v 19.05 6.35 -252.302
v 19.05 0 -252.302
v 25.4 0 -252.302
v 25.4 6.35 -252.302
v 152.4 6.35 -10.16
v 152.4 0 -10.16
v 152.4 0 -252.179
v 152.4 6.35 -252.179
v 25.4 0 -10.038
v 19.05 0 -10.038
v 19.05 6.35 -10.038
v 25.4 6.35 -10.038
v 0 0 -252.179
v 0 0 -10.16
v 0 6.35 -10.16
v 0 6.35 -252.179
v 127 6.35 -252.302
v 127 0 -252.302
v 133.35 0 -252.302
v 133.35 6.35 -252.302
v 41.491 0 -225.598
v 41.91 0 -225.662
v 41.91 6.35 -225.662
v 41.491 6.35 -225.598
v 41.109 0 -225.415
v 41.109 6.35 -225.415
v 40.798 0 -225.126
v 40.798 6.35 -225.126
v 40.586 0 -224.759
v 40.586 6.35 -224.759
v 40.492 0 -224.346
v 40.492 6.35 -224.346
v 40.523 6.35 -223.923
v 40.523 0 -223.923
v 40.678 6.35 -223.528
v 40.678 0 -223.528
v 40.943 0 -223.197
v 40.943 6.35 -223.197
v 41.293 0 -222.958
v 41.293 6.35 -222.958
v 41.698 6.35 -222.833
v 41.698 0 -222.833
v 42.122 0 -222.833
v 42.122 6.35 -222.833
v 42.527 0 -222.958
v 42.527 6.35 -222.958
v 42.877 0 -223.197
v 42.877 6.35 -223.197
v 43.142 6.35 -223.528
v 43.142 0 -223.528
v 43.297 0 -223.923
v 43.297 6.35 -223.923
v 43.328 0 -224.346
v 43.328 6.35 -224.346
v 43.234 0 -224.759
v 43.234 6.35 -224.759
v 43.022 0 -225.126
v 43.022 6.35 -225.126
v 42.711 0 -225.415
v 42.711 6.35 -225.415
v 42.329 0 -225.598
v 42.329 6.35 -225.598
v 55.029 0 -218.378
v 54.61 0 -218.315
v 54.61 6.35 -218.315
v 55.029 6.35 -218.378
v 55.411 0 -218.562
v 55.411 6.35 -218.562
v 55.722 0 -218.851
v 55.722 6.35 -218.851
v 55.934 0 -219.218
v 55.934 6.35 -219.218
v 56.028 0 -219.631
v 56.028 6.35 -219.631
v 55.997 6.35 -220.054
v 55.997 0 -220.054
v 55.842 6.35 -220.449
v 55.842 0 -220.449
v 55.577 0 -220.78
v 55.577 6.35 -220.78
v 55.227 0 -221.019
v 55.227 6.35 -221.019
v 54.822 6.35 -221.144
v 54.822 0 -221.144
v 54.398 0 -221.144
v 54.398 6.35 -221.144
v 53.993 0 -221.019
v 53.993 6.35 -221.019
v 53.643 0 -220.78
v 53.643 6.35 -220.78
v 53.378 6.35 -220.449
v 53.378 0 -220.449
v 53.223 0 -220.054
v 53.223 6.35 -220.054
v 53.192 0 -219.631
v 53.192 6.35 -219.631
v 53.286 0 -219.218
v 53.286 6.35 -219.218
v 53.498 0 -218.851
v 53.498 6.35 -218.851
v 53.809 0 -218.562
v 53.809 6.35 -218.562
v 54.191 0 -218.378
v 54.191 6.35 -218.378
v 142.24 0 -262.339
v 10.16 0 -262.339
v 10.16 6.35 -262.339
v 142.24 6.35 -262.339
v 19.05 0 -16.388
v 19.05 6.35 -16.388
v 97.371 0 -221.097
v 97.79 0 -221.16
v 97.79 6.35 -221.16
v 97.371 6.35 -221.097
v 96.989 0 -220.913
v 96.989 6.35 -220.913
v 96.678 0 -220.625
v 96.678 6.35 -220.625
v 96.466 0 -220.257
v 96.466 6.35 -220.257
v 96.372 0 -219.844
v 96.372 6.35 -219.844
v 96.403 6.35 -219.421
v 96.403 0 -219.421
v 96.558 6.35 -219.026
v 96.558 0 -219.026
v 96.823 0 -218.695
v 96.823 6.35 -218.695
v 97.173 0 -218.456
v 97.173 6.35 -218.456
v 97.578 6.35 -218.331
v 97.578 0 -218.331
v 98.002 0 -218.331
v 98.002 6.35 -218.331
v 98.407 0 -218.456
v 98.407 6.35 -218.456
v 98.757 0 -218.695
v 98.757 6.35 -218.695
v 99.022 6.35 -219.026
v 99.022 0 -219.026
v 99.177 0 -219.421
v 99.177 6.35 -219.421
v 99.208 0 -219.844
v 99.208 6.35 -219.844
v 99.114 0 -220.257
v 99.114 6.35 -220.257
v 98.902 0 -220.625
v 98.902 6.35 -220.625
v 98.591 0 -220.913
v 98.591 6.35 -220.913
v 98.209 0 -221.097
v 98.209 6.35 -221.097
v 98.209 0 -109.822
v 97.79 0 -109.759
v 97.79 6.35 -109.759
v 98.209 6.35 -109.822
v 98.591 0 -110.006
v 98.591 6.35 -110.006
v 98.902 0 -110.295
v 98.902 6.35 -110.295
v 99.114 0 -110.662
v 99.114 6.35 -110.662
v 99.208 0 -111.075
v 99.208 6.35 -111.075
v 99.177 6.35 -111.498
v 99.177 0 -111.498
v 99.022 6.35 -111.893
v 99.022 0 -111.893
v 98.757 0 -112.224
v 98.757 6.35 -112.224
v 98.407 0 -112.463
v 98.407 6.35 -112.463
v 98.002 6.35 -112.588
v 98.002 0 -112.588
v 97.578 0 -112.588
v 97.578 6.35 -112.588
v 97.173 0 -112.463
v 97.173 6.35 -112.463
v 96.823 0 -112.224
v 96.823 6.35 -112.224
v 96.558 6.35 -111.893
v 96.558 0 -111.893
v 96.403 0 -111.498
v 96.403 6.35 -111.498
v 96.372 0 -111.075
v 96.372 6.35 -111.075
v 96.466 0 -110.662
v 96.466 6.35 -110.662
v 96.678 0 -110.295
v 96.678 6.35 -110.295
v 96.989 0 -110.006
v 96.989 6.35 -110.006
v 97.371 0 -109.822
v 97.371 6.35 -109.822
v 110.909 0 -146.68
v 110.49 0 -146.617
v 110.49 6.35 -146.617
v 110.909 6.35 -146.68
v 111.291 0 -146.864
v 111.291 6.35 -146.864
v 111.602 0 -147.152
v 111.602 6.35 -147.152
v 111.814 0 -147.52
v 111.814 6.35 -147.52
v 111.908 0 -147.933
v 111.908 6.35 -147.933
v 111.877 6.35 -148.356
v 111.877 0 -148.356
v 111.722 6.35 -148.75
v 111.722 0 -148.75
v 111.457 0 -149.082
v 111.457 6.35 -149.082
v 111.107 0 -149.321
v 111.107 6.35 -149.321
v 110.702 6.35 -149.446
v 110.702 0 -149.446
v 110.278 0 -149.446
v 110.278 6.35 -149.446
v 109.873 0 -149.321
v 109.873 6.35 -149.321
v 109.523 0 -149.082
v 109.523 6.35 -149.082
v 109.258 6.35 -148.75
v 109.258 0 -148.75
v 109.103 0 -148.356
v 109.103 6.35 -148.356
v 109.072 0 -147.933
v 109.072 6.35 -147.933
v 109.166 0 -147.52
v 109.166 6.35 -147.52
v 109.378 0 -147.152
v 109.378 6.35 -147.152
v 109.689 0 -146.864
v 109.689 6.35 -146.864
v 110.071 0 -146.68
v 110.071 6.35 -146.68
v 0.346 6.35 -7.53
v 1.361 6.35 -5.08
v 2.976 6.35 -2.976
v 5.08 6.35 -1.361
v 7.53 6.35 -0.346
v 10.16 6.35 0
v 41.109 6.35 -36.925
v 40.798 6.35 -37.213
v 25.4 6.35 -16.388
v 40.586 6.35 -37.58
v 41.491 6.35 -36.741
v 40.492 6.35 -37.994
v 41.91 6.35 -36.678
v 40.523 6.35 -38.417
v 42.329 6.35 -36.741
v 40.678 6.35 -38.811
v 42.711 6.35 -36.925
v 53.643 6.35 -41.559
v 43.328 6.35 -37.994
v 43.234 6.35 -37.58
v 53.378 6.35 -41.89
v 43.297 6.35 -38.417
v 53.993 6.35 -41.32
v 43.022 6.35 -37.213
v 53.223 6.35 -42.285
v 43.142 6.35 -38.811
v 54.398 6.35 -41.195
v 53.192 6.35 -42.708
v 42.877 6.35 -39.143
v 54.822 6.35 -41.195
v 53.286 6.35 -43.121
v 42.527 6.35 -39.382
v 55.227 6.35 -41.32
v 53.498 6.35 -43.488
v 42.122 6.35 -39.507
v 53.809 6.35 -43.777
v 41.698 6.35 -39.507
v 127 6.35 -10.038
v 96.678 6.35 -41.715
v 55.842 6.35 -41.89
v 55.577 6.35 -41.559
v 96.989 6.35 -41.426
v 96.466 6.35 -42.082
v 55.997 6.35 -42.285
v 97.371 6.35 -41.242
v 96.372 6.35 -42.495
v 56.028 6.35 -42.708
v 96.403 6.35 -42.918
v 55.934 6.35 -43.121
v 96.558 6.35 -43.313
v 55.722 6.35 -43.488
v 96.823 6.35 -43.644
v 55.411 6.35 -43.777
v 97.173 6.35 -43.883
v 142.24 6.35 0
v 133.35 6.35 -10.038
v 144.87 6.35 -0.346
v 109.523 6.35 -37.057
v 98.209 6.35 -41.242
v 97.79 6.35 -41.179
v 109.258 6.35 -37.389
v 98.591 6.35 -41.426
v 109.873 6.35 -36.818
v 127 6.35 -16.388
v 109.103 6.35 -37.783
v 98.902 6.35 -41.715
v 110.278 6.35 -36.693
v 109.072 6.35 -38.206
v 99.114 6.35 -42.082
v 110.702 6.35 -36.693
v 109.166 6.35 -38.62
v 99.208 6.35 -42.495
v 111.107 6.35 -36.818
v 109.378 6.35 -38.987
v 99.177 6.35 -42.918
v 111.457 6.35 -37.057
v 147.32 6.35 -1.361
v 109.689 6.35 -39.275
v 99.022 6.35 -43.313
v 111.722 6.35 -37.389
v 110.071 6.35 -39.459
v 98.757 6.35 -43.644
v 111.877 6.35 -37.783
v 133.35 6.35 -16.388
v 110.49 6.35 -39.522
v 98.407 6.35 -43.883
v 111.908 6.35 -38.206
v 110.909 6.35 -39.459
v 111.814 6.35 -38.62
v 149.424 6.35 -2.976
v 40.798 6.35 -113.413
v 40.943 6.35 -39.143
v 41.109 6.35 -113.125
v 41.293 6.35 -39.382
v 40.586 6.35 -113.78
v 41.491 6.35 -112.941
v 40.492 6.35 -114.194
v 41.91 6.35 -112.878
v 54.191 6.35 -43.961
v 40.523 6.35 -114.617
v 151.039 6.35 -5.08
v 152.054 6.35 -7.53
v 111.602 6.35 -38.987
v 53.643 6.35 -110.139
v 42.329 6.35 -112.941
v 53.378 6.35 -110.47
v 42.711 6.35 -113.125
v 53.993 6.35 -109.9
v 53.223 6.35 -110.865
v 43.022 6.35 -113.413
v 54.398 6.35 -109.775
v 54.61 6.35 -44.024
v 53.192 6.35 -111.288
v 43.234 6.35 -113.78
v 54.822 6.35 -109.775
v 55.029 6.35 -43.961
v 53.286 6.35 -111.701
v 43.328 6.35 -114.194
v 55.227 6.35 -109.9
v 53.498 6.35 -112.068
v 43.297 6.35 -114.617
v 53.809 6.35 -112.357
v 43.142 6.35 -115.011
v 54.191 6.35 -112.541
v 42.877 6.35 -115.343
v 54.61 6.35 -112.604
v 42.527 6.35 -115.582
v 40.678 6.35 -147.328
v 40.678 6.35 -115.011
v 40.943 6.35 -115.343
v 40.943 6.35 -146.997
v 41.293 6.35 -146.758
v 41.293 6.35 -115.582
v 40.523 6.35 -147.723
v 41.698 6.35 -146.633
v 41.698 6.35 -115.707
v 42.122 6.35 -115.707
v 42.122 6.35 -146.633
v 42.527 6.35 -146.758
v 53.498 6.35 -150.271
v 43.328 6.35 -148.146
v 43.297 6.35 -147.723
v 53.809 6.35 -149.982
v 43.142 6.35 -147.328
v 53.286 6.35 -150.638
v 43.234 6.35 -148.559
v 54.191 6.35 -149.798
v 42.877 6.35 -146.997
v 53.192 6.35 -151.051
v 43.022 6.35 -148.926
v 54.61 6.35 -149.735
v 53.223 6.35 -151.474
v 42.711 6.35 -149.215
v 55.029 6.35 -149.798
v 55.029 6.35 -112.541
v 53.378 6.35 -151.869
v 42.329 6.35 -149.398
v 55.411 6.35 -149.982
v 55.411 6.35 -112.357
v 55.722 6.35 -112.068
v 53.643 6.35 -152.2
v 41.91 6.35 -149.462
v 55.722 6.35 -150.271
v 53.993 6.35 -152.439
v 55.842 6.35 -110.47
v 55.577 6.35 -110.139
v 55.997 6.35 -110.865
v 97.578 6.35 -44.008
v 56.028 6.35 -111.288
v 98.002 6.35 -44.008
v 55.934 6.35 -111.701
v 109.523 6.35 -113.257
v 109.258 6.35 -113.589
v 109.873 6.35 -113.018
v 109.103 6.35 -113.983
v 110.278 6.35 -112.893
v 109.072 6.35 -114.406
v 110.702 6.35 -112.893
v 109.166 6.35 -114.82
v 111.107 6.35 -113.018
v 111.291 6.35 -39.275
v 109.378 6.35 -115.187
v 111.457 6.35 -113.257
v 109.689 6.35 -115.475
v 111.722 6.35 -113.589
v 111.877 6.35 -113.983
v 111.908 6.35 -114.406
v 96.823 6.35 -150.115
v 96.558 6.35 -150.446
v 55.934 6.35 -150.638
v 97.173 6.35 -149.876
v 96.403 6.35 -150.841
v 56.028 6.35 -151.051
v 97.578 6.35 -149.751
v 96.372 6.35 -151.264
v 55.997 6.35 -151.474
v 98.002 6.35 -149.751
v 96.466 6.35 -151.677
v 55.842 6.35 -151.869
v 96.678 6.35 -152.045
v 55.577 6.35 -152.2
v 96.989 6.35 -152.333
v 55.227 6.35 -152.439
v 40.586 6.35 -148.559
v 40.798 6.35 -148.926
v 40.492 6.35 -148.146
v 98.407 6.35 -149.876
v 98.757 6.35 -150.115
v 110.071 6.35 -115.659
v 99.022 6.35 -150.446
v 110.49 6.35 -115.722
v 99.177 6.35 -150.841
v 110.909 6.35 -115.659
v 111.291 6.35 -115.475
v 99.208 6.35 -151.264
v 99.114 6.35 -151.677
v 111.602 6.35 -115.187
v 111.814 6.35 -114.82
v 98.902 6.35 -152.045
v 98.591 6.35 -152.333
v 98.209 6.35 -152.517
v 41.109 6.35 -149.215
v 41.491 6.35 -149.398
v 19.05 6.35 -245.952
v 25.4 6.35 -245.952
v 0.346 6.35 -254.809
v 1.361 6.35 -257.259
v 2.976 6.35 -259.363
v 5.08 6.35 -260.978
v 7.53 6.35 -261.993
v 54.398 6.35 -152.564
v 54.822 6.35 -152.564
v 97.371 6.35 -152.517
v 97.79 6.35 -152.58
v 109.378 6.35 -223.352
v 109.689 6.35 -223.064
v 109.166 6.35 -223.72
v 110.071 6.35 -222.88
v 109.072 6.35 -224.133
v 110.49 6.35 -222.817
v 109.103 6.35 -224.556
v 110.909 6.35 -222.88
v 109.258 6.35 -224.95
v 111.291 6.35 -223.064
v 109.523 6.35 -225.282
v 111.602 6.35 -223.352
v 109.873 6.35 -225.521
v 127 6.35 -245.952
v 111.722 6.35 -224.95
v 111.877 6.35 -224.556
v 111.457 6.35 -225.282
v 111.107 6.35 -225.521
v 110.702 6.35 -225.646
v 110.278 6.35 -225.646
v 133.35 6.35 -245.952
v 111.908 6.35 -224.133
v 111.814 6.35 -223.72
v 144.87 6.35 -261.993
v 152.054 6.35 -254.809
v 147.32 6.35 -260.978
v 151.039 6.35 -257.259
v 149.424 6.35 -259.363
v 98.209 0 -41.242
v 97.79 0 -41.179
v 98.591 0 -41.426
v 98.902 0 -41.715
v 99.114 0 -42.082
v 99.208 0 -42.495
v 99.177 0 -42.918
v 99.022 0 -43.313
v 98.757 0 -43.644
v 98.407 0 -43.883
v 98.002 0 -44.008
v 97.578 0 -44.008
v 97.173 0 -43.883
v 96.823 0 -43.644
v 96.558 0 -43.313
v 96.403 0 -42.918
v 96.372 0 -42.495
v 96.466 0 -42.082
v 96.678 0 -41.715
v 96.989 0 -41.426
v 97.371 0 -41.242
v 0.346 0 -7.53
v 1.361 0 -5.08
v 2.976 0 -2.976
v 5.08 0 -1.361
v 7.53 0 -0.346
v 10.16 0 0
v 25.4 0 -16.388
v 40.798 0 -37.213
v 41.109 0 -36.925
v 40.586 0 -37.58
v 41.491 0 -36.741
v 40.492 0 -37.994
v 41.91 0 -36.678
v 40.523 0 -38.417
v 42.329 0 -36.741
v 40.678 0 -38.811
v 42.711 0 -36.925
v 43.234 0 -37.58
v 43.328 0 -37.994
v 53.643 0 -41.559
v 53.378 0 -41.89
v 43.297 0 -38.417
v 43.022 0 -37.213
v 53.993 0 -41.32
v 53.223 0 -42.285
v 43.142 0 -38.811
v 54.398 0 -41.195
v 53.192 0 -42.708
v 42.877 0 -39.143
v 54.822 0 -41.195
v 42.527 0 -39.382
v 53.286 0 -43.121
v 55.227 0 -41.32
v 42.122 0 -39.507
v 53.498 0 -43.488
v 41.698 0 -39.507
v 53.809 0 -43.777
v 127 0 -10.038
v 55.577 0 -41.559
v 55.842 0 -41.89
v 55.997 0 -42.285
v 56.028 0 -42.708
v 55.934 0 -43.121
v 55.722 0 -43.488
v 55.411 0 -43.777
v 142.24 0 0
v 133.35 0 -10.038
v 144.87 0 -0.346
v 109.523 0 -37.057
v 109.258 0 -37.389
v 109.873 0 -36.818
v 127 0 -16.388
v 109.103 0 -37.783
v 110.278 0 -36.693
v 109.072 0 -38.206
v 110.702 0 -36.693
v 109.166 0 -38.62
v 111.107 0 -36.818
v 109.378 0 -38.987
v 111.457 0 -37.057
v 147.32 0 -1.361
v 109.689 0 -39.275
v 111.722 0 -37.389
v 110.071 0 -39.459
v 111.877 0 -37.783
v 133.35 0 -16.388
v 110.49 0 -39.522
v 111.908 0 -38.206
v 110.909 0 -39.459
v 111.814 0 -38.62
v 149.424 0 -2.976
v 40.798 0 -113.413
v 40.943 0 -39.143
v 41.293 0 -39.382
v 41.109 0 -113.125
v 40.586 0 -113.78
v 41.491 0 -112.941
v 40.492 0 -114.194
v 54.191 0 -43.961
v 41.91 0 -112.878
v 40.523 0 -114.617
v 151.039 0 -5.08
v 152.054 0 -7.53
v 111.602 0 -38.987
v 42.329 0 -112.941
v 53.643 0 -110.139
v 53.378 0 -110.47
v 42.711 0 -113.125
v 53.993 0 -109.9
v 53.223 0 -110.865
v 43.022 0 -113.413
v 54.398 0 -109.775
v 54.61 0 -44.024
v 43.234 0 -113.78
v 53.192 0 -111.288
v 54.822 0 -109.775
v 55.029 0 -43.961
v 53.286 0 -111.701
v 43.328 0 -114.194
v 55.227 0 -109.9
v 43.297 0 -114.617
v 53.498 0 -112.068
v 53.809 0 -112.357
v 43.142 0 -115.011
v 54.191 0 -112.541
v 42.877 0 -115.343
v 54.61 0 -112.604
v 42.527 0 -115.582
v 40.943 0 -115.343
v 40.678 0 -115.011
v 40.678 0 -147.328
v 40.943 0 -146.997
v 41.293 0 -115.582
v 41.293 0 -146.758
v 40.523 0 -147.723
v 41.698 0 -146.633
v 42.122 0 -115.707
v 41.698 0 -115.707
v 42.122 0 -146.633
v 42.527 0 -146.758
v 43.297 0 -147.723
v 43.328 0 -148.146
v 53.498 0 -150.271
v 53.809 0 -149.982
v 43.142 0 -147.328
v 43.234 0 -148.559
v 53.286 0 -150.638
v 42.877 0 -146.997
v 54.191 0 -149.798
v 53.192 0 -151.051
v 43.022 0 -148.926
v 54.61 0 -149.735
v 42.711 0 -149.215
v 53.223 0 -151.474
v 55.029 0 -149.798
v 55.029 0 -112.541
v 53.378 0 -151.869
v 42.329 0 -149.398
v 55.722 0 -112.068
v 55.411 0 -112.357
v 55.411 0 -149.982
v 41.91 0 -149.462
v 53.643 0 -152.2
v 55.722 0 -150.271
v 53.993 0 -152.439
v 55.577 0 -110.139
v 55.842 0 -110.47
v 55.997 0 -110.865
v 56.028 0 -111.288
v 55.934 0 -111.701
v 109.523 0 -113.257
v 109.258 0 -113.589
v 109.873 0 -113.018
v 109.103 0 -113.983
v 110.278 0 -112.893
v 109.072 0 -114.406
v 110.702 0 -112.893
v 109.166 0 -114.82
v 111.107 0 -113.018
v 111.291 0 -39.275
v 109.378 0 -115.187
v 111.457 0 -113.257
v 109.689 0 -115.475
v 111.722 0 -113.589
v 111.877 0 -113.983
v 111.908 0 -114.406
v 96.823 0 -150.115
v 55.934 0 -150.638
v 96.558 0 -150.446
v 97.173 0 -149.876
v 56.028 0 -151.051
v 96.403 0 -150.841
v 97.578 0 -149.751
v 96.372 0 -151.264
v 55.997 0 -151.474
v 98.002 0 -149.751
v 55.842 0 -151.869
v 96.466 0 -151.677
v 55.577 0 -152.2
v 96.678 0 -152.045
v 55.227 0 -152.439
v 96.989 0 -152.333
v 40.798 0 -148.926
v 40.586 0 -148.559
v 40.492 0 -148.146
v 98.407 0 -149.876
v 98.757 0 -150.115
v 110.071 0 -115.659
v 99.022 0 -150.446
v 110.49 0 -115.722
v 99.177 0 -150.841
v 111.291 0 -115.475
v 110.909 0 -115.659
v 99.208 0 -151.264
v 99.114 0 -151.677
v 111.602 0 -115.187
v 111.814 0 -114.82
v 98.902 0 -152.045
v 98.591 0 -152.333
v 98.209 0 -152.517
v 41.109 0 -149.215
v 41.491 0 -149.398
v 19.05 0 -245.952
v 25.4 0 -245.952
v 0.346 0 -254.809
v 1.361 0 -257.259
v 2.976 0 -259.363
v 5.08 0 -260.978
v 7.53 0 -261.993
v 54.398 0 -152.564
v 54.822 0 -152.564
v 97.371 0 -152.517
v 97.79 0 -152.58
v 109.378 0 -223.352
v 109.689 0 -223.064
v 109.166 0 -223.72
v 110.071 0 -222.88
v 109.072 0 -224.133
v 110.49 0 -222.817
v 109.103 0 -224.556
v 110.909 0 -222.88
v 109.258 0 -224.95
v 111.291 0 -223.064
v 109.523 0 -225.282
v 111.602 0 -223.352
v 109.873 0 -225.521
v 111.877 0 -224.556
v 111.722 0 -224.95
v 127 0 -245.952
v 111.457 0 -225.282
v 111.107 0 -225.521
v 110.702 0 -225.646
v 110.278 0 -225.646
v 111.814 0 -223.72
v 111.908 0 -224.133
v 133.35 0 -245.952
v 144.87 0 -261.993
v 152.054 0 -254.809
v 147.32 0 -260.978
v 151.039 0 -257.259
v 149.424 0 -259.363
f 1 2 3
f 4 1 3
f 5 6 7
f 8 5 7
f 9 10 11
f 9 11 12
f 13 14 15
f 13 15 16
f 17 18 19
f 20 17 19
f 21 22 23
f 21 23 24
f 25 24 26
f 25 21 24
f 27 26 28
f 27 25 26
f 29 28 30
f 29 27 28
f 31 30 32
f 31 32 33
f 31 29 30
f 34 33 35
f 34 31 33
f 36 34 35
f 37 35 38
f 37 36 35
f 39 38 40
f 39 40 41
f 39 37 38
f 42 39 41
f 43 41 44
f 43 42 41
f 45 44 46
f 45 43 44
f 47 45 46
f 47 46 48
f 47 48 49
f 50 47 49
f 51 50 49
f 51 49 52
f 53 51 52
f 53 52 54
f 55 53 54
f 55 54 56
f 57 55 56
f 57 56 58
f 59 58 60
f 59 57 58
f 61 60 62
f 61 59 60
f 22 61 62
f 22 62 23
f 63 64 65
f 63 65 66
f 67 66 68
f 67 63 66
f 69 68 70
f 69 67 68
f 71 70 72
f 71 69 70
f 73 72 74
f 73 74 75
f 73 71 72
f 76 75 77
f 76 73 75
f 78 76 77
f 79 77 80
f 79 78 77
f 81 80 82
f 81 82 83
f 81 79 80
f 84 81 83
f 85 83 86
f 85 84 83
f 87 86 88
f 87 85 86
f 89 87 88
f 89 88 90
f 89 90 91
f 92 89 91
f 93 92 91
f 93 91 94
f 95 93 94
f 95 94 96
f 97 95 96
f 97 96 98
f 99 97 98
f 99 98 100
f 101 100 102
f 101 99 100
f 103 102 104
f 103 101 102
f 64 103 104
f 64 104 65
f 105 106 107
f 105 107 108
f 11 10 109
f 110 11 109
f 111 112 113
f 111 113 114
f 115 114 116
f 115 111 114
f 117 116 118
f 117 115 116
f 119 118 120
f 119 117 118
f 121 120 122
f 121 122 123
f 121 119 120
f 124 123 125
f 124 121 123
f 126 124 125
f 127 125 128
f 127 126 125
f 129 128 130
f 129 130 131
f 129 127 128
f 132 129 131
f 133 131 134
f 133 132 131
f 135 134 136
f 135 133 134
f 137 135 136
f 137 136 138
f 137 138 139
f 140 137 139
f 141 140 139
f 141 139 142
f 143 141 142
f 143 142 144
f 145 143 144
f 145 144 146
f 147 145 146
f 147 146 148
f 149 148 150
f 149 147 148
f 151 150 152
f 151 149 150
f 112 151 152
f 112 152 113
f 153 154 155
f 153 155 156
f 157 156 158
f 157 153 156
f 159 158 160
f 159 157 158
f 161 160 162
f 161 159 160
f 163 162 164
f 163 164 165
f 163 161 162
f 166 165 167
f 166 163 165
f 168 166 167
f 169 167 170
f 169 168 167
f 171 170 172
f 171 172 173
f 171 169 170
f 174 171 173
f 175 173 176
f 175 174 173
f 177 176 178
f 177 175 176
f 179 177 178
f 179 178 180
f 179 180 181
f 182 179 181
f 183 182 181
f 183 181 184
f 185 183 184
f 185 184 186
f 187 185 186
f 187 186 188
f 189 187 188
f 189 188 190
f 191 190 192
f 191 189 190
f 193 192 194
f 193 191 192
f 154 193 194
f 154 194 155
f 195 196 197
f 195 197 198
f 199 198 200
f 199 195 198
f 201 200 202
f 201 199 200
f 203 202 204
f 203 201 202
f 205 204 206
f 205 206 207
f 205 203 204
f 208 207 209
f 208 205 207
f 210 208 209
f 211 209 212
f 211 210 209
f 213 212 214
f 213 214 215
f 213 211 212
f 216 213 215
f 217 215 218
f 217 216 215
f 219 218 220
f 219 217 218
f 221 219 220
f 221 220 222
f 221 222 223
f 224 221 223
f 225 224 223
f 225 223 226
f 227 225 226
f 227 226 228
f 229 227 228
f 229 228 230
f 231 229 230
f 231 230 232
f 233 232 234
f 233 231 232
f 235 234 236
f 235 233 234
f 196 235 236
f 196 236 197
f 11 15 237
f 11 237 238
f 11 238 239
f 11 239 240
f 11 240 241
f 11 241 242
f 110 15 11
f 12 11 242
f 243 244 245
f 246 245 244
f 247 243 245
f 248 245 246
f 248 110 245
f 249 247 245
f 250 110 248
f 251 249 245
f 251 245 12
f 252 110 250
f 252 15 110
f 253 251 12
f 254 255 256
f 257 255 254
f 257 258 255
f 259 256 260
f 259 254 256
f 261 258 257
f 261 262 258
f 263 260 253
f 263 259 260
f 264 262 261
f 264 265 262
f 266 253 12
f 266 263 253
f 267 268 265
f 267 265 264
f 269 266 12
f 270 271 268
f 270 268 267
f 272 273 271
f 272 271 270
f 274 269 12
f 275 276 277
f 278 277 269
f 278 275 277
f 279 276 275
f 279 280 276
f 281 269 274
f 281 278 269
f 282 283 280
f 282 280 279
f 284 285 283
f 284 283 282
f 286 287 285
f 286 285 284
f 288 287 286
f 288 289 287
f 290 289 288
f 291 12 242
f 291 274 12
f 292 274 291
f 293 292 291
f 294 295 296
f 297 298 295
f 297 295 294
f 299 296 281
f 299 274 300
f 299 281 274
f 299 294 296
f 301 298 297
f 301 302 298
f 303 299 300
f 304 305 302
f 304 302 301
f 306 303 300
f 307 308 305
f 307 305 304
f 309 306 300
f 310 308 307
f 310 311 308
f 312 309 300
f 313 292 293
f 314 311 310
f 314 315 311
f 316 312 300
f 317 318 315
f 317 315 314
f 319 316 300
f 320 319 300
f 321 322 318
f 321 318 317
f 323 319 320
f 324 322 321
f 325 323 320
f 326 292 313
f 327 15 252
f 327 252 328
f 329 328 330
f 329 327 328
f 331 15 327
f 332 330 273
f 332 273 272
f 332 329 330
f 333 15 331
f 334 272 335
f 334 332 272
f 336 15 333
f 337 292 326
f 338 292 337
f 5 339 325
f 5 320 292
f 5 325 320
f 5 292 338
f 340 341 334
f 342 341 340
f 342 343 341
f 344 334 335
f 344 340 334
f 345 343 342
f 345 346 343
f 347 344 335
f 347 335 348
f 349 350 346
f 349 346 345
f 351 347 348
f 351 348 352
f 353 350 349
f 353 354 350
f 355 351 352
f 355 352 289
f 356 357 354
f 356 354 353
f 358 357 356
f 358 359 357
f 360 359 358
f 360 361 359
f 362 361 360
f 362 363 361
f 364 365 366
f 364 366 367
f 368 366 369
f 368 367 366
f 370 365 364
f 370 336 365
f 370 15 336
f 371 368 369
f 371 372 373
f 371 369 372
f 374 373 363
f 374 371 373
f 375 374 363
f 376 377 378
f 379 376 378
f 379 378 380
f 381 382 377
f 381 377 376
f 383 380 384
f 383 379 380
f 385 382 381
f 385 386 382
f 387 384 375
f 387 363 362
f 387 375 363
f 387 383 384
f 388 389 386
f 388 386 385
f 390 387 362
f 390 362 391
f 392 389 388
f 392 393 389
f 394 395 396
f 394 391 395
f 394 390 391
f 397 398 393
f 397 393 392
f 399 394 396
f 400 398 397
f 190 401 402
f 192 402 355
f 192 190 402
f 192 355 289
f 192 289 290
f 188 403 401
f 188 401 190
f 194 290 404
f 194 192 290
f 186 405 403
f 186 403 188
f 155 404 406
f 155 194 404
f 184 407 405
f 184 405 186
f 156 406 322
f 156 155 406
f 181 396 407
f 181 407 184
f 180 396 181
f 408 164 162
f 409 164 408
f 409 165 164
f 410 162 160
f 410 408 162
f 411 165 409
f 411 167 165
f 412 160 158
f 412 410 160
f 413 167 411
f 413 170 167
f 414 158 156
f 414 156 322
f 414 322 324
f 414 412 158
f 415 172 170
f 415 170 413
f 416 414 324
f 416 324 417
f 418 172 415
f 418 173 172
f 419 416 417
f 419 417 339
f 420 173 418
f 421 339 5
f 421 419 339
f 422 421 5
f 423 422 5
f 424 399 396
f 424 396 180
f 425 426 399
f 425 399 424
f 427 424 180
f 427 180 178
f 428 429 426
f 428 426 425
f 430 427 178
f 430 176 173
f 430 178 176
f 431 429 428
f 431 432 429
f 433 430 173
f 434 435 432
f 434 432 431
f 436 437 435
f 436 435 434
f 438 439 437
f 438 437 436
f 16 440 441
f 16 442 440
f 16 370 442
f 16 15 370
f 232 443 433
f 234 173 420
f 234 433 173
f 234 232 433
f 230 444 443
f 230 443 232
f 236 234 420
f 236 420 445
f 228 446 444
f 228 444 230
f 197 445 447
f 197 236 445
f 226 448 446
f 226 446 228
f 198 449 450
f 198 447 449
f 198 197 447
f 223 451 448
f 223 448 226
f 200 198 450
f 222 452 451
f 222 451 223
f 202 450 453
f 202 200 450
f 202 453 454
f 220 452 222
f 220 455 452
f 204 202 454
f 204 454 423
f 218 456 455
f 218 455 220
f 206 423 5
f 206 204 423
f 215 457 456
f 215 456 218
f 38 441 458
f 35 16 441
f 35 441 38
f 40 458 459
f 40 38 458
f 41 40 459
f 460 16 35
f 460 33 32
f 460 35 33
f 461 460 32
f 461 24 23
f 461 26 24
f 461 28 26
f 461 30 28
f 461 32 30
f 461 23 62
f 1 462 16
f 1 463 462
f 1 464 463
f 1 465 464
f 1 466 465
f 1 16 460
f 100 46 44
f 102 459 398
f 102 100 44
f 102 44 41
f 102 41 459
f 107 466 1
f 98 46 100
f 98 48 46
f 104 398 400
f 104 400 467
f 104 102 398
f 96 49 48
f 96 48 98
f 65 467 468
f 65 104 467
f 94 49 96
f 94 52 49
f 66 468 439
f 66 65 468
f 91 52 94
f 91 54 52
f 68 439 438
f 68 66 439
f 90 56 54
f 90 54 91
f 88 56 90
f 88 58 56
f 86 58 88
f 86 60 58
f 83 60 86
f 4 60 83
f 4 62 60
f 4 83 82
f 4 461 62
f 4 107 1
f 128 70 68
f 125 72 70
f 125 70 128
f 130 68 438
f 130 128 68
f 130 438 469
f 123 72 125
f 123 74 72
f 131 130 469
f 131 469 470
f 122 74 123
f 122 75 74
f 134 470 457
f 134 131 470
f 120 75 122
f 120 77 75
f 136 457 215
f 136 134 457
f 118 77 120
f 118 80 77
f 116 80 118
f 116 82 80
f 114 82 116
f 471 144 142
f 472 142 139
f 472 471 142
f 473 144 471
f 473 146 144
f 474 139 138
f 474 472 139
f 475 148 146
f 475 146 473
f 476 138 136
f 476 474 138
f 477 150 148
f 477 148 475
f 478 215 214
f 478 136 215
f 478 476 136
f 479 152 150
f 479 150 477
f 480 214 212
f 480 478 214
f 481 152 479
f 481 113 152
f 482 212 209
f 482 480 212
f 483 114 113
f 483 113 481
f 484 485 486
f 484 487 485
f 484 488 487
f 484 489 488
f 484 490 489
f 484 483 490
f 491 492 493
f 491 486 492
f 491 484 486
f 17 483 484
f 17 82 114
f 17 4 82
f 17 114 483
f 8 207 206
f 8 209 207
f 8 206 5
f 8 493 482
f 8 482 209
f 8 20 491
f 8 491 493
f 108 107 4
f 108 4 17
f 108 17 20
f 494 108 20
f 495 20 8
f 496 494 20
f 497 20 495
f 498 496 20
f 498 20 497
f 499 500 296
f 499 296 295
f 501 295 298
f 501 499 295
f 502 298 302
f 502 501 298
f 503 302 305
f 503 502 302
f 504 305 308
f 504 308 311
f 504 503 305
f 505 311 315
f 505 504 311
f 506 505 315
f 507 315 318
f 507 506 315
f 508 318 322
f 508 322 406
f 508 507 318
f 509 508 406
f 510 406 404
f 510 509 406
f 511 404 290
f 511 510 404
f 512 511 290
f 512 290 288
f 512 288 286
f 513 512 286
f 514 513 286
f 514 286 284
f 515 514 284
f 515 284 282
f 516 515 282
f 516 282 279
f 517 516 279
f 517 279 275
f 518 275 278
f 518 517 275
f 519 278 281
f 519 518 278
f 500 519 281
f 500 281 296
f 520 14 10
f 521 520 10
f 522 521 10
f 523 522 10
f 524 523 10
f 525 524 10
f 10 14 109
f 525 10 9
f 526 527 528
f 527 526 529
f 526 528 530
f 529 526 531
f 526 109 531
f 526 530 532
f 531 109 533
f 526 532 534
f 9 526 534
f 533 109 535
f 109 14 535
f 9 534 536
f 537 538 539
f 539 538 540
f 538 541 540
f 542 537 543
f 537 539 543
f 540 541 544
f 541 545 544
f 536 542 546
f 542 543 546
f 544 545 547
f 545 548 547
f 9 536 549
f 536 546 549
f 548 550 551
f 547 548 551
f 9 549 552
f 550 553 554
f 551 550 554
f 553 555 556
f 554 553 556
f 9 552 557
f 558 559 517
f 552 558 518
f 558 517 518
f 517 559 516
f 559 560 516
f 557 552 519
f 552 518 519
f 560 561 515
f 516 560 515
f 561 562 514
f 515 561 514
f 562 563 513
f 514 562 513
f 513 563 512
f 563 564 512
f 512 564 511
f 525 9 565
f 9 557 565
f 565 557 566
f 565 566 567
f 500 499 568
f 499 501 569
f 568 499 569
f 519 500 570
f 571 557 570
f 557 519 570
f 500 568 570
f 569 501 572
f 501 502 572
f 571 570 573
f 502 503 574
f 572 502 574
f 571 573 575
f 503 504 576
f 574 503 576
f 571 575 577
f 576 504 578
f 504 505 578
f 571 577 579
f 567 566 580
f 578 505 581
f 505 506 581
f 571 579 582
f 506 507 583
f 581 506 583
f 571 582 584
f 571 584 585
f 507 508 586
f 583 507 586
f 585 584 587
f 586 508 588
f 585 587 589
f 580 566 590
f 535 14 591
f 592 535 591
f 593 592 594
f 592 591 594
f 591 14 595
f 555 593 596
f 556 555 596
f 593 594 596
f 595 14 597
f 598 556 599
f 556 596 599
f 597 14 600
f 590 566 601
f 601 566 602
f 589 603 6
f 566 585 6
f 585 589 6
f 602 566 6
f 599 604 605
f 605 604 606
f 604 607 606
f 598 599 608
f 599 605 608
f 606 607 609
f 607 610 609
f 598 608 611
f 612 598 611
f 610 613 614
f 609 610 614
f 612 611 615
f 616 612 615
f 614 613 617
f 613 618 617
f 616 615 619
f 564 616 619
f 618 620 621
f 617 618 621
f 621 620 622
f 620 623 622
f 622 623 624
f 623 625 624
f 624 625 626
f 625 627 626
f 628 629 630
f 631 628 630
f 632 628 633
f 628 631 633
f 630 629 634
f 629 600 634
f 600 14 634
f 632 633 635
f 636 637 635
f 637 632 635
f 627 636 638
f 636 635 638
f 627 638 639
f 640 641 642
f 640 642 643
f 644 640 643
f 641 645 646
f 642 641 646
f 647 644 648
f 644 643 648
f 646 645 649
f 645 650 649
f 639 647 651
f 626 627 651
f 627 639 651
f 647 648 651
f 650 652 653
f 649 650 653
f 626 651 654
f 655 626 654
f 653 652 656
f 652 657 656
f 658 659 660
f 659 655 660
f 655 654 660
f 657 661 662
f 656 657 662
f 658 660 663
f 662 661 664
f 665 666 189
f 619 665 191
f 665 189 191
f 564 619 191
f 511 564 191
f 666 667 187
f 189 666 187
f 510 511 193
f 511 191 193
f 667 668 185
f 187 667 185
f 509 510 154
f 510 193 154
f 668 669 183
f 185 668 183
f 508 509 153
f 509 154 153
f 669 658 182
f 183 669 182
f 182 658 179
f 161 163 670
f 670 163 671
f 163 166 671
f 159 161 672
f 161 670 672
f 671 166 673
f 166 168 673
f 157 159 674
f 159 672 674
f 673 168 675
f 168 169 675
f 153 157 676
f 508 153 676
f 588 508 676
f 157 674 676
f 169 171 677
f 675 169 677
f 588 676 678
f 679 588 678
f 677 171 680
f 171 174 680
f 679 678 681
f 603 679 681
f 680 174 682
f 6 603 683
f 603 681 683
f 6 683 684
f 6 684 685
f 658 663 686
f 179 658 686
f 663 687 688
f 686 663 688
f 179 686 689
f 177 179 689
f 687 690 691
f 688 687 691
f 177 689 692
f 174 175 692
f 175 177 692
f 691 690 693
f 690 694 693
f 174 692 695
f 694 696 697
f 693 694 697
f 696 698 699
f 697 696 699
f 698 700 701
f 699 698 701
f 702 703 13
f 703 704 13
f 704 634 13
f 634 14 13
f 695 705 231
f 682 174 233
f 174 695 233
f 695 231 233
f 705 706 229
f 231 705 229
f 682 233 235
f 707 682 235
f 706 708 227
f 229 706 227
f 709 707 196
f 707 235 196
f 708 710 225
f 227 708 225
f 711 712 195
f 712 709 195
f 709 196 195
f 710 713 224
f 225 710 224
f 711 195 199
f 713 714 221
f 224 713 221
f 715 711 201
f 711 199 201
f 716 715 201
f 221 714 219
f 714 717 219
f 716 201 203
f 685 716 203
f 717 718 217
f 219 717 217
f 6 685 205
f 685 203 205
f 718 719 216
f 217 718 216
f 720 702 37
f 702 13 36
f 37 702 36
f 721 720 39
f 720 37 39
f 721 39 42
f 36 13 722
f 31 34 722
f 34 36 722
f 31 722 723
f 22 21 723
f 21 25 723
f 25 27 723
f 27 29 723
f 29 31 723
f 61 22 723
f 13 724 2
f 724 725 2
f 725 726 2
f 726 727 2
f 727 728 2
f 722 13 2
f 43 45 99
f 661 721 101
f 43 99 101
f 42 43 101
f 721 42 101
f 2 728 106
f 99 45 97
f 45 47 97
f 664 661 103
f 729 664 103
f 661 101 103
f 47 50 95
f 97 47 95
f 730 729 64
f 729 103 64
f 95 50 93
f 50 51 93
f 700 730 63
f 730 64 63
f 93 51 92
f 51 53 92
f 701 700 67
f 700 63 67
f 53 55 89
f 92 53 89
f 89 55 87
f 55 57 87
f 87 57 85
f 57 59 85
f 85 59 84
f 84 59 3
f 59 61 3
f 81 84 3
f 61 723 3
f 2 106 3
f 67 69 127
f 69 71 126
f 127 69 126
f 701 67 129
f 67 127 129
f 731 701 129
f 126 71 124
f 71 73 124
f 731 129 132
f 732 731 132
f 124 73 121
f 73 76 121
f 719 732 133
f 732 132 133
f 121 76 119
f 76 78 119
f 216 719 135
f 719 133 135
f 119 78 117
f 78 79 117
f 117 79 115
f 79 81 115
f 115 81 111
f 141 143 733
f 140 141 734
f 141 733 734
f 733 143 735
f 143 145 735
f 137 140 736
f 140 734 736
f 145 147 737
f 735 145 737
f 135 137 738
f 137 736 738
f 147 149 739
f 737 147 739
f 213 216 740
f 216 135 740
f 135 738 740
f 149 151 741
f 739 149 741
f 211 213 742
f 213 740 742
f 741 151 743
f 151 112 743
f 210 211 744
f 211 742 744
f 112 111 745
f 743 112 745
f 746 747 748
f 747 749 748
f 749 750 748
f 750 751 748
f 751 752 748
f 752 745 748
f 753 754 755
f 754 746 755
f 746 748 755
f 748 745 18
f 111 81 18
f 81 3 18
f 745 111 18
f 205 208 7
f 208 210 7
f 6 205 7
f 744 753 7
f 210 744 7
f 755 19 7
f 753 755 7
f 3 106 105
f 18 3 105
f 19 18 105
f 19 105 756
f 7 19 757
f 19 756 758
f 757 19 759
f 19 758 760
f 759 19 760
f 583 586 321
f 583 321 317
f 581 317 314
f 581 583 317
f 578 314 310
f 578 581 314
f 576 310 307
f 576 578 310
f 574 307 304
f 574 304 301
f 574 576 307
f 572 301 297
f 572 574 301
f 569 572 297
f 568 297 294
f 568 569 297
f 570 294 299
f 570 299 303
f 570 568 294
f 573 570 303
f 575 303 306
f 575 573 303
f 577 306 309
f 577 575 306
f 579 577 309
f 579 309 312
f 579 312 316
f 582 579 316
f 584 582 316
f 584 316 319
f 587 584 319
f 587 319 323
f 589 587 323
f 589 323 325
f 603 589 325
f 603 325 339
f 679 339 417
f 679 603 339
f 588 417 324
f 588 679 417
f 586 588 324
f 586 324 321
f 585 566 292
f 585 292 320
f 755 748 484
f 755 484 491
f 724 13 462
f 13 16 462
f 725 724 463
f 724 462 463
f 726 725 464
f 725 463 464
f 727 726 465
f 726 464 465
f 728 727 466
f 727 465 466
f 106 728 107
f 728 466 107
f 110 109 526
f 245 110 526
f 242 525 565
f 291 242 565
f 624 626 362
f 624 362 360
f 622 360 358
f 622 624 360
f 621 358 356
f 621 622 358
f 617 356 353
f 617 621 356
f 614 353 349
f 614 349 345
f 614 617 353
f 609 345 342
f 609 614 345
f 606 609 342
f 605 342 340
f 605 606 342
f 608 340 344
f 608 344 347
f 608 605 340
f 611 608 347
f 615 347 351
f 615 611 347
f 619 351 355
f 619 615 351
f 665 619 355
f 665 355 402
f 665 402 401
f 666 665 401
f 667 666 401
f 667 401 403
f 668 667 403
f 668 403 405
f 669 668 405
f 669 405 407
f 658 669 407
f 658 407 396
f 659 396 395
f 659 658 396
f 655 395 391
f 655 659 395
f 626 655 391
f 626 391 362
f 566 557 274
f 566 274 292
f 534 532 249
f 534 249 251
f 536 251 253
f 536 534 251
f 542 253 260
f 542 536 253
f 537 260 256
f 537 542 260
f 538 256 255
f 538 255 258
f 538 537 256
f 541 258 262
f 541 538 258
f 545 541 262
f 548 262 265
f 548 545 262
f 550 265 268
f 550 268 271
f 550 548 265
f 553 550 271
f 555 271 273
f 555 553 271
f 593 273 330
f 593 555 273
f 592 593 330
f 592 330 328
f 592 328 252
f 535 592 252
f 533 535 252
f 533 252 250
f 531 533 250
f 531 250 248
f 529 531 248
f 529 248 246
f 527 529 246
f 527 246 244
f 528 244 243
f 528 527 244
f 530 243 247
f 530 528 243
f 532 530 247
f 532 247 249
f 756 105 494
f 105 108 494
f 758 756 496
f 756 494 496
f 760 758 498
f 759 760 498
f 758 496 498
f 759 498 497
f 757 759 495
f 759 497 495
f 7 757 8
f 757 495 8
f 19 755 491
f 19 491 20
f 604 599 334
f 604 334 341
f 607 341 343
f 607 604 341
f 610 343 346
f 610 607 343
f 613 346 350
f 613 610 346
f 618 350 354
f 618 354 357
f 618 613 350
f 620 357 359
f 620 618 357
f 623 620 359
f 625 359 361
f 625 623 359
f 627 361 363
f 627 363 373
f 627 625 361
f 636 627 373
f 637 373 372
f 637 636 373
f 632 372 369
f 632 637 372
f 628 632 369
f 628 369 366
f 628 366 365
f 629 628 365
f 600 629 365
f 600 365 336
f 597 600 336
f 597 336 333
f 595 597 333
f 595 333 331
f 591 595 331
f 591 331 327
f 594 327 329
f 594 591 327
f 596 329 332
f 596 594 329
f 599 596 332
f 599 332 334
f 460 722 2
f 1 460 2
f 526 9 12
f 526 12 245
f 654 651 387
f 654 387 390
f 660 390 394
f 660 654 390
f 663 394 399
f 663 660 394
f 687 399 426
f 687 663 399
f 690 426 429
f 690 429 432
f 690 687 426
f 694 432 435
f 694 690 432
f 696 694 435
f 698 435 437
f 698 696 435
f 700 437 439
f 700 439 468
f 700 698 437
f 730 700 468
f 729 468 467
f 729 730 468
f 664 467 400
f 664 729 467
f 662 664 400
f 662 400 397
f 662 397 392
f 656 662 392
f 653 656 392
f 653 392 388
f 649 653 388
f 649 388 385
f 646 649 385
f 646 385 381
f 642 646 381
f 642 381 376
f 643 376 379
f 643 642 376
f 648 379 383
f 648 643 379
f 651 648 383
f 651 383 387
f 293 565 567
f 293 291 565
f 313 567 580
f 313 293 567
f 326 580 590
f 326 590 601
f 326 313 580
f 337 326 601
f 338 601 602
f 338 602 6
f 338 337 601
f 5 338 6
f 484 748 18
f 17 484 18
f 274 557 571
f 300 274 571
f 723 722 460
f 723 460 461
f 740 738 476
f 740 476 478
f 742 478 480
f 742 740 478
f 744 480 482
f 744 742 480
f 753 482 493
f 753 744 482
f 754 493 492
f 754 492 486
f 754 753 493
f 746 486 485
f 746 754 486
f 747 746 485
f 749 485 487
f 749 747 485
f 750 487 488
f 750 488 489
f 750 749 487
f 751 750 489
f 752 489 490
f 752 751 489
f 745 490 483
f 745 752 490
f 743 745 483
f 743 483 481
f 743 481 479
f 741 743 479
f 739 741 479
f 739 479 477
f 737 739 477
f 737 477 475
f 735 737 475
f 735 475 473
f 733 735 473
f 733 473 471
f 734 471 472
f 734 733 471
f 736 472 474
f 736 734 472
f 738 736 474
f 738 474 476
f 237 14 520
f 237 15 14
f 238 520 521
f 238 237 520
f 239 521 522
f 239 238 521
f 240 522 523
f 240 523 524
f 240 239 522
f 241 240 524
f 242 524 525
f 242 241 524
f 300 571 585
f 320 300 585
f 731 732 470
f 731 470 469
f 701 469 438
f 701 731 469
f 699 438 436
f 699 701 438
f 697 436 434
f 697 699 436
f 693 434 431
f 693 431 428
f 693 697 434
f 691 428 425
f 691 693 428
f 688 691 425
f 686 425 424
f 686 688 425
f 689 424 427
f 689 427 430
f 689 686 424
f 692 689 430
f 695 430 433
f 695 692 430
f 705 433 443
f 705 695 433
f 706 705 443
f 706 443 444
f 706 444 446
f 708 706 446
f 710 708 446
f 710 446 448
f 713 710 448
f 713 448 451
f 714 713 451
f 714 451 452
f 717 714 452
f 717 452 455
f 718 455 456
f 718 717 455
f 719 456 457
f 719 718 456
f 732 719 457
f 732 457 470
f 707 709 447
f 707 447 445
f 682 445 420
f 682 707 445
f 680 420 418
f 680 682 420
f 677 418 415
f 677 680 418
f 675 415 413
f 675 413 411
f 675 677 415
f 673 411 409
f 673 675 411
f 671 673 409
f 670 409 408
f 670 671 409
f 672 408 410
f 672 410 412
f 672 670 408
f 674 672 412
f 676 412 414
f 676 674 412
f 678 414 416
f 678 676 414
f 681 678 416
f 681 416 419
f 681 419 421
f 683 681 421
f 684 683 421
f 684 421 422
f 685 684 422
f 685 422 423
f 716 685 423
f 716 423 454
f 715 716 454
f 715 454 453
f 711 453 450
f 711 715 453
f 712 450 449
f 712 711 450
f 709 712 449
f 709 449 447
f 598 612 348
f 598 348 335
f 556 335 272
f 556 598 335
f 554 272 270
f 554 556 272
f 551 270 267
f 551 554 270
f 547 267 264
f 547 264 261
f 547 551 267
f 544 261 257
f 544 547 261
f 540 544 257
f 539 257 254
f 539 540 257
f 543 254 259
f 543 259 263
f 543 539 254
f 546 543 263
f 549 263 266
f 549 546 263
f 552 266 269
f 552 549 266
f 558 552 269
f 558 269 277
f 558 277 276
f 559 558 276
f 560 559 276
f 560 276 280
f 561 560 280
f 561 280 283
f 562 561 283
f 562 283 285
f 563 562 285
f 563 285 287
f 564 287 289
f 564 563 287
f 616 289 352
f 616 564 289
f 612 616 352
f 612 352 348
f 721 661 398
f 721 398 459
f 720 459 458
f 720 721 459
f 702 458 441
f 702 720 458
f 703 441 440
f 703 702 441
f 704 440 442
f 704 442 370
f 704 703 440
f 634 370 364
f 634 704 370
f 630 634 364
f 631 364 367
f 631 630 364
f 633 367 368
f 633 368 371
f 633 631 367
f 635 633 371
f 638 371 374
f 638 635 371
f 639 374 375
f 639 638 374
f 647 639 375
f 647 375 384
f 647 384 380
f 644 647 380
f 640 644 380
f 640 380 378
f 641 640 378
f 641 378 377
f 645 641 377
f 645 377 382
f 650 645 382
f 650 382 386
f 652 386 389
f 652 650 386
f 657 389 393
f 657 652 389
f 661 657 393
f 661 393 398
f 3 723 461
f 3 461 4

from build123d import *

# Parameters (mm, degrees)
SKETCH3_W           = 152.4
SKETCH3_H           = 262.339276313
SKETCH3_R           = 1.4224
SKETCH3_W_2         = 6.35
SKETCH3_H_2         = 6.35
BOSS_EXTRUDE1_DEPTH = 6.35
FILLET1_R           = 10.16


with BuildPart() as part:
    # Sketch3 → Boss-Extrude1 (new body)
    with BuildSketch(Plane(origin=(0, 0, 0), x_dir=(1, 0, 0), z_dir=(0, 1, 0))):
        with Locations((76.2, 131.169638157)):
            Rectangle(SKETCH3_W, SKETCH3_H)
        with Locations(Location((41.91, 38.1, 0), (0, 0, 270))):
            Circle(SKETCH3_R, mode=Mode.SUBTRACT)
        with Locations(Location((41.91, 114.3, 0), (0, 0, 270))):
            Circle(SKETCH3_R, mode=Mode.SUBTRACT)
        with Locations(Location((110.49, 114.3, 0), (0, 0, 90))):
            Circle(SKETCH3_R, mode=Mode.SUBTRACT)
        with Locations(Location((110.49, 38.1, 0), (0, 0, 90))):
            Circle(SKETCH3_R, mode=Mode.SUBTRACT)
        with Locations(Location((54.61, 151.157668748, 0), (0, 0, 270))):
            Circle(SKETCH3_R, mode=Mode.SUBTRACT)
        with Locations(Location((54.61, 219.737668748, 0), (0, 0, 270))):
            Circle(SKETCH3_R, mode=Mode.SUBTRACT)
        with Locations(Location((97.79, 151.157668748, 0), (0, 0, 90))):
            Circle(SKETCH3_R, mode=Mode.SUBTRACT)
        with Locations(Location((97.79, 219.737668748, 0), (0, 0, 90))):
            Circle(SKETCH3_R, mode=Mode.SUBTRACT)
        with Locations(Location((97.79, 42.601607565, 0), (0, 0, 270))):
            Circle(SKETCH3_R, mode=Mode.SUBTRACT)
        with Locations(Location((97.79, 111.181607565, 0), (0, 0, 270))):
            Circle(SKETCH3_R, mode=Mode.SUBTRACT)
        with Locations(Location((54.61, 111.181607565, 0), (0, 0, 90))):
            Circle(SKETCH3_R, mode=Mode.SUBTRACT)
        with Locations(Location((54.61, 42.601607565, 0), (0, 0, 90))):
            Circle(SKETCH3_R, mode=Mode.SUBTRACT)
        with Locations(Location((110.49, 148.039276313, 0), (0, 0, 270))):
            Circle(SKETCH3_R, mode=Mode.SUBTRACT)
        with Locations(Location((110.49, 224.239276313, 0), (0, 0, 270))):
            Circle(SKETCH3_R, mode=Mode.SUBTRACT)
        with Locations(Location((41.91, 224.239276313, 0), (0, 0, 90))):
            Circle(SKETCH3_R, mode=Mode.SUBTRACT)
        with Locations(Location((41.91, 148.039276313, 0), (0, 0, 90))):
            Circle(SKETCH3_R, mode=Mode.SUBTRACT)
        with Locations((22.225, 13.212735966)):
            Rectangle(SKETCH3_W_2, SKETCH3_H_2, mode=Mode.SUBTRACT)
        with Locations((130.175, 13.212735966)):
            Rectangle(SKETCH3_W_2, SKETCH3_H_2, mode=Mode.SUBTRACT)
        with Locations((130.175, 249.126540348)):
            Rectangle(SKETCH3_W_2, SKETCH3_H_2, mode=Mode.SUBTRACT)
        with Locations((22.225, 249.126540348)):
            Rectangle(SKETCH3_W_2, SKETCH3_H_2, mode=Mode.SUBTRACT)
    extrude(amount=BOSS_EXTRUDE1_DEPTH)

    # Fillet1
    fillet1_edges = [part.edges().sort_by_distance(p)[0] for p in [
        (0, 3.175, -262.339276313),
        (152.4, 3.175, -262.339276313),
        (152.4, 3.175, 0),
        (0, 3.175, 0),
    ]]
    fillet(fillet1_edges, radius=FILLET1_R)


solid = part.part
